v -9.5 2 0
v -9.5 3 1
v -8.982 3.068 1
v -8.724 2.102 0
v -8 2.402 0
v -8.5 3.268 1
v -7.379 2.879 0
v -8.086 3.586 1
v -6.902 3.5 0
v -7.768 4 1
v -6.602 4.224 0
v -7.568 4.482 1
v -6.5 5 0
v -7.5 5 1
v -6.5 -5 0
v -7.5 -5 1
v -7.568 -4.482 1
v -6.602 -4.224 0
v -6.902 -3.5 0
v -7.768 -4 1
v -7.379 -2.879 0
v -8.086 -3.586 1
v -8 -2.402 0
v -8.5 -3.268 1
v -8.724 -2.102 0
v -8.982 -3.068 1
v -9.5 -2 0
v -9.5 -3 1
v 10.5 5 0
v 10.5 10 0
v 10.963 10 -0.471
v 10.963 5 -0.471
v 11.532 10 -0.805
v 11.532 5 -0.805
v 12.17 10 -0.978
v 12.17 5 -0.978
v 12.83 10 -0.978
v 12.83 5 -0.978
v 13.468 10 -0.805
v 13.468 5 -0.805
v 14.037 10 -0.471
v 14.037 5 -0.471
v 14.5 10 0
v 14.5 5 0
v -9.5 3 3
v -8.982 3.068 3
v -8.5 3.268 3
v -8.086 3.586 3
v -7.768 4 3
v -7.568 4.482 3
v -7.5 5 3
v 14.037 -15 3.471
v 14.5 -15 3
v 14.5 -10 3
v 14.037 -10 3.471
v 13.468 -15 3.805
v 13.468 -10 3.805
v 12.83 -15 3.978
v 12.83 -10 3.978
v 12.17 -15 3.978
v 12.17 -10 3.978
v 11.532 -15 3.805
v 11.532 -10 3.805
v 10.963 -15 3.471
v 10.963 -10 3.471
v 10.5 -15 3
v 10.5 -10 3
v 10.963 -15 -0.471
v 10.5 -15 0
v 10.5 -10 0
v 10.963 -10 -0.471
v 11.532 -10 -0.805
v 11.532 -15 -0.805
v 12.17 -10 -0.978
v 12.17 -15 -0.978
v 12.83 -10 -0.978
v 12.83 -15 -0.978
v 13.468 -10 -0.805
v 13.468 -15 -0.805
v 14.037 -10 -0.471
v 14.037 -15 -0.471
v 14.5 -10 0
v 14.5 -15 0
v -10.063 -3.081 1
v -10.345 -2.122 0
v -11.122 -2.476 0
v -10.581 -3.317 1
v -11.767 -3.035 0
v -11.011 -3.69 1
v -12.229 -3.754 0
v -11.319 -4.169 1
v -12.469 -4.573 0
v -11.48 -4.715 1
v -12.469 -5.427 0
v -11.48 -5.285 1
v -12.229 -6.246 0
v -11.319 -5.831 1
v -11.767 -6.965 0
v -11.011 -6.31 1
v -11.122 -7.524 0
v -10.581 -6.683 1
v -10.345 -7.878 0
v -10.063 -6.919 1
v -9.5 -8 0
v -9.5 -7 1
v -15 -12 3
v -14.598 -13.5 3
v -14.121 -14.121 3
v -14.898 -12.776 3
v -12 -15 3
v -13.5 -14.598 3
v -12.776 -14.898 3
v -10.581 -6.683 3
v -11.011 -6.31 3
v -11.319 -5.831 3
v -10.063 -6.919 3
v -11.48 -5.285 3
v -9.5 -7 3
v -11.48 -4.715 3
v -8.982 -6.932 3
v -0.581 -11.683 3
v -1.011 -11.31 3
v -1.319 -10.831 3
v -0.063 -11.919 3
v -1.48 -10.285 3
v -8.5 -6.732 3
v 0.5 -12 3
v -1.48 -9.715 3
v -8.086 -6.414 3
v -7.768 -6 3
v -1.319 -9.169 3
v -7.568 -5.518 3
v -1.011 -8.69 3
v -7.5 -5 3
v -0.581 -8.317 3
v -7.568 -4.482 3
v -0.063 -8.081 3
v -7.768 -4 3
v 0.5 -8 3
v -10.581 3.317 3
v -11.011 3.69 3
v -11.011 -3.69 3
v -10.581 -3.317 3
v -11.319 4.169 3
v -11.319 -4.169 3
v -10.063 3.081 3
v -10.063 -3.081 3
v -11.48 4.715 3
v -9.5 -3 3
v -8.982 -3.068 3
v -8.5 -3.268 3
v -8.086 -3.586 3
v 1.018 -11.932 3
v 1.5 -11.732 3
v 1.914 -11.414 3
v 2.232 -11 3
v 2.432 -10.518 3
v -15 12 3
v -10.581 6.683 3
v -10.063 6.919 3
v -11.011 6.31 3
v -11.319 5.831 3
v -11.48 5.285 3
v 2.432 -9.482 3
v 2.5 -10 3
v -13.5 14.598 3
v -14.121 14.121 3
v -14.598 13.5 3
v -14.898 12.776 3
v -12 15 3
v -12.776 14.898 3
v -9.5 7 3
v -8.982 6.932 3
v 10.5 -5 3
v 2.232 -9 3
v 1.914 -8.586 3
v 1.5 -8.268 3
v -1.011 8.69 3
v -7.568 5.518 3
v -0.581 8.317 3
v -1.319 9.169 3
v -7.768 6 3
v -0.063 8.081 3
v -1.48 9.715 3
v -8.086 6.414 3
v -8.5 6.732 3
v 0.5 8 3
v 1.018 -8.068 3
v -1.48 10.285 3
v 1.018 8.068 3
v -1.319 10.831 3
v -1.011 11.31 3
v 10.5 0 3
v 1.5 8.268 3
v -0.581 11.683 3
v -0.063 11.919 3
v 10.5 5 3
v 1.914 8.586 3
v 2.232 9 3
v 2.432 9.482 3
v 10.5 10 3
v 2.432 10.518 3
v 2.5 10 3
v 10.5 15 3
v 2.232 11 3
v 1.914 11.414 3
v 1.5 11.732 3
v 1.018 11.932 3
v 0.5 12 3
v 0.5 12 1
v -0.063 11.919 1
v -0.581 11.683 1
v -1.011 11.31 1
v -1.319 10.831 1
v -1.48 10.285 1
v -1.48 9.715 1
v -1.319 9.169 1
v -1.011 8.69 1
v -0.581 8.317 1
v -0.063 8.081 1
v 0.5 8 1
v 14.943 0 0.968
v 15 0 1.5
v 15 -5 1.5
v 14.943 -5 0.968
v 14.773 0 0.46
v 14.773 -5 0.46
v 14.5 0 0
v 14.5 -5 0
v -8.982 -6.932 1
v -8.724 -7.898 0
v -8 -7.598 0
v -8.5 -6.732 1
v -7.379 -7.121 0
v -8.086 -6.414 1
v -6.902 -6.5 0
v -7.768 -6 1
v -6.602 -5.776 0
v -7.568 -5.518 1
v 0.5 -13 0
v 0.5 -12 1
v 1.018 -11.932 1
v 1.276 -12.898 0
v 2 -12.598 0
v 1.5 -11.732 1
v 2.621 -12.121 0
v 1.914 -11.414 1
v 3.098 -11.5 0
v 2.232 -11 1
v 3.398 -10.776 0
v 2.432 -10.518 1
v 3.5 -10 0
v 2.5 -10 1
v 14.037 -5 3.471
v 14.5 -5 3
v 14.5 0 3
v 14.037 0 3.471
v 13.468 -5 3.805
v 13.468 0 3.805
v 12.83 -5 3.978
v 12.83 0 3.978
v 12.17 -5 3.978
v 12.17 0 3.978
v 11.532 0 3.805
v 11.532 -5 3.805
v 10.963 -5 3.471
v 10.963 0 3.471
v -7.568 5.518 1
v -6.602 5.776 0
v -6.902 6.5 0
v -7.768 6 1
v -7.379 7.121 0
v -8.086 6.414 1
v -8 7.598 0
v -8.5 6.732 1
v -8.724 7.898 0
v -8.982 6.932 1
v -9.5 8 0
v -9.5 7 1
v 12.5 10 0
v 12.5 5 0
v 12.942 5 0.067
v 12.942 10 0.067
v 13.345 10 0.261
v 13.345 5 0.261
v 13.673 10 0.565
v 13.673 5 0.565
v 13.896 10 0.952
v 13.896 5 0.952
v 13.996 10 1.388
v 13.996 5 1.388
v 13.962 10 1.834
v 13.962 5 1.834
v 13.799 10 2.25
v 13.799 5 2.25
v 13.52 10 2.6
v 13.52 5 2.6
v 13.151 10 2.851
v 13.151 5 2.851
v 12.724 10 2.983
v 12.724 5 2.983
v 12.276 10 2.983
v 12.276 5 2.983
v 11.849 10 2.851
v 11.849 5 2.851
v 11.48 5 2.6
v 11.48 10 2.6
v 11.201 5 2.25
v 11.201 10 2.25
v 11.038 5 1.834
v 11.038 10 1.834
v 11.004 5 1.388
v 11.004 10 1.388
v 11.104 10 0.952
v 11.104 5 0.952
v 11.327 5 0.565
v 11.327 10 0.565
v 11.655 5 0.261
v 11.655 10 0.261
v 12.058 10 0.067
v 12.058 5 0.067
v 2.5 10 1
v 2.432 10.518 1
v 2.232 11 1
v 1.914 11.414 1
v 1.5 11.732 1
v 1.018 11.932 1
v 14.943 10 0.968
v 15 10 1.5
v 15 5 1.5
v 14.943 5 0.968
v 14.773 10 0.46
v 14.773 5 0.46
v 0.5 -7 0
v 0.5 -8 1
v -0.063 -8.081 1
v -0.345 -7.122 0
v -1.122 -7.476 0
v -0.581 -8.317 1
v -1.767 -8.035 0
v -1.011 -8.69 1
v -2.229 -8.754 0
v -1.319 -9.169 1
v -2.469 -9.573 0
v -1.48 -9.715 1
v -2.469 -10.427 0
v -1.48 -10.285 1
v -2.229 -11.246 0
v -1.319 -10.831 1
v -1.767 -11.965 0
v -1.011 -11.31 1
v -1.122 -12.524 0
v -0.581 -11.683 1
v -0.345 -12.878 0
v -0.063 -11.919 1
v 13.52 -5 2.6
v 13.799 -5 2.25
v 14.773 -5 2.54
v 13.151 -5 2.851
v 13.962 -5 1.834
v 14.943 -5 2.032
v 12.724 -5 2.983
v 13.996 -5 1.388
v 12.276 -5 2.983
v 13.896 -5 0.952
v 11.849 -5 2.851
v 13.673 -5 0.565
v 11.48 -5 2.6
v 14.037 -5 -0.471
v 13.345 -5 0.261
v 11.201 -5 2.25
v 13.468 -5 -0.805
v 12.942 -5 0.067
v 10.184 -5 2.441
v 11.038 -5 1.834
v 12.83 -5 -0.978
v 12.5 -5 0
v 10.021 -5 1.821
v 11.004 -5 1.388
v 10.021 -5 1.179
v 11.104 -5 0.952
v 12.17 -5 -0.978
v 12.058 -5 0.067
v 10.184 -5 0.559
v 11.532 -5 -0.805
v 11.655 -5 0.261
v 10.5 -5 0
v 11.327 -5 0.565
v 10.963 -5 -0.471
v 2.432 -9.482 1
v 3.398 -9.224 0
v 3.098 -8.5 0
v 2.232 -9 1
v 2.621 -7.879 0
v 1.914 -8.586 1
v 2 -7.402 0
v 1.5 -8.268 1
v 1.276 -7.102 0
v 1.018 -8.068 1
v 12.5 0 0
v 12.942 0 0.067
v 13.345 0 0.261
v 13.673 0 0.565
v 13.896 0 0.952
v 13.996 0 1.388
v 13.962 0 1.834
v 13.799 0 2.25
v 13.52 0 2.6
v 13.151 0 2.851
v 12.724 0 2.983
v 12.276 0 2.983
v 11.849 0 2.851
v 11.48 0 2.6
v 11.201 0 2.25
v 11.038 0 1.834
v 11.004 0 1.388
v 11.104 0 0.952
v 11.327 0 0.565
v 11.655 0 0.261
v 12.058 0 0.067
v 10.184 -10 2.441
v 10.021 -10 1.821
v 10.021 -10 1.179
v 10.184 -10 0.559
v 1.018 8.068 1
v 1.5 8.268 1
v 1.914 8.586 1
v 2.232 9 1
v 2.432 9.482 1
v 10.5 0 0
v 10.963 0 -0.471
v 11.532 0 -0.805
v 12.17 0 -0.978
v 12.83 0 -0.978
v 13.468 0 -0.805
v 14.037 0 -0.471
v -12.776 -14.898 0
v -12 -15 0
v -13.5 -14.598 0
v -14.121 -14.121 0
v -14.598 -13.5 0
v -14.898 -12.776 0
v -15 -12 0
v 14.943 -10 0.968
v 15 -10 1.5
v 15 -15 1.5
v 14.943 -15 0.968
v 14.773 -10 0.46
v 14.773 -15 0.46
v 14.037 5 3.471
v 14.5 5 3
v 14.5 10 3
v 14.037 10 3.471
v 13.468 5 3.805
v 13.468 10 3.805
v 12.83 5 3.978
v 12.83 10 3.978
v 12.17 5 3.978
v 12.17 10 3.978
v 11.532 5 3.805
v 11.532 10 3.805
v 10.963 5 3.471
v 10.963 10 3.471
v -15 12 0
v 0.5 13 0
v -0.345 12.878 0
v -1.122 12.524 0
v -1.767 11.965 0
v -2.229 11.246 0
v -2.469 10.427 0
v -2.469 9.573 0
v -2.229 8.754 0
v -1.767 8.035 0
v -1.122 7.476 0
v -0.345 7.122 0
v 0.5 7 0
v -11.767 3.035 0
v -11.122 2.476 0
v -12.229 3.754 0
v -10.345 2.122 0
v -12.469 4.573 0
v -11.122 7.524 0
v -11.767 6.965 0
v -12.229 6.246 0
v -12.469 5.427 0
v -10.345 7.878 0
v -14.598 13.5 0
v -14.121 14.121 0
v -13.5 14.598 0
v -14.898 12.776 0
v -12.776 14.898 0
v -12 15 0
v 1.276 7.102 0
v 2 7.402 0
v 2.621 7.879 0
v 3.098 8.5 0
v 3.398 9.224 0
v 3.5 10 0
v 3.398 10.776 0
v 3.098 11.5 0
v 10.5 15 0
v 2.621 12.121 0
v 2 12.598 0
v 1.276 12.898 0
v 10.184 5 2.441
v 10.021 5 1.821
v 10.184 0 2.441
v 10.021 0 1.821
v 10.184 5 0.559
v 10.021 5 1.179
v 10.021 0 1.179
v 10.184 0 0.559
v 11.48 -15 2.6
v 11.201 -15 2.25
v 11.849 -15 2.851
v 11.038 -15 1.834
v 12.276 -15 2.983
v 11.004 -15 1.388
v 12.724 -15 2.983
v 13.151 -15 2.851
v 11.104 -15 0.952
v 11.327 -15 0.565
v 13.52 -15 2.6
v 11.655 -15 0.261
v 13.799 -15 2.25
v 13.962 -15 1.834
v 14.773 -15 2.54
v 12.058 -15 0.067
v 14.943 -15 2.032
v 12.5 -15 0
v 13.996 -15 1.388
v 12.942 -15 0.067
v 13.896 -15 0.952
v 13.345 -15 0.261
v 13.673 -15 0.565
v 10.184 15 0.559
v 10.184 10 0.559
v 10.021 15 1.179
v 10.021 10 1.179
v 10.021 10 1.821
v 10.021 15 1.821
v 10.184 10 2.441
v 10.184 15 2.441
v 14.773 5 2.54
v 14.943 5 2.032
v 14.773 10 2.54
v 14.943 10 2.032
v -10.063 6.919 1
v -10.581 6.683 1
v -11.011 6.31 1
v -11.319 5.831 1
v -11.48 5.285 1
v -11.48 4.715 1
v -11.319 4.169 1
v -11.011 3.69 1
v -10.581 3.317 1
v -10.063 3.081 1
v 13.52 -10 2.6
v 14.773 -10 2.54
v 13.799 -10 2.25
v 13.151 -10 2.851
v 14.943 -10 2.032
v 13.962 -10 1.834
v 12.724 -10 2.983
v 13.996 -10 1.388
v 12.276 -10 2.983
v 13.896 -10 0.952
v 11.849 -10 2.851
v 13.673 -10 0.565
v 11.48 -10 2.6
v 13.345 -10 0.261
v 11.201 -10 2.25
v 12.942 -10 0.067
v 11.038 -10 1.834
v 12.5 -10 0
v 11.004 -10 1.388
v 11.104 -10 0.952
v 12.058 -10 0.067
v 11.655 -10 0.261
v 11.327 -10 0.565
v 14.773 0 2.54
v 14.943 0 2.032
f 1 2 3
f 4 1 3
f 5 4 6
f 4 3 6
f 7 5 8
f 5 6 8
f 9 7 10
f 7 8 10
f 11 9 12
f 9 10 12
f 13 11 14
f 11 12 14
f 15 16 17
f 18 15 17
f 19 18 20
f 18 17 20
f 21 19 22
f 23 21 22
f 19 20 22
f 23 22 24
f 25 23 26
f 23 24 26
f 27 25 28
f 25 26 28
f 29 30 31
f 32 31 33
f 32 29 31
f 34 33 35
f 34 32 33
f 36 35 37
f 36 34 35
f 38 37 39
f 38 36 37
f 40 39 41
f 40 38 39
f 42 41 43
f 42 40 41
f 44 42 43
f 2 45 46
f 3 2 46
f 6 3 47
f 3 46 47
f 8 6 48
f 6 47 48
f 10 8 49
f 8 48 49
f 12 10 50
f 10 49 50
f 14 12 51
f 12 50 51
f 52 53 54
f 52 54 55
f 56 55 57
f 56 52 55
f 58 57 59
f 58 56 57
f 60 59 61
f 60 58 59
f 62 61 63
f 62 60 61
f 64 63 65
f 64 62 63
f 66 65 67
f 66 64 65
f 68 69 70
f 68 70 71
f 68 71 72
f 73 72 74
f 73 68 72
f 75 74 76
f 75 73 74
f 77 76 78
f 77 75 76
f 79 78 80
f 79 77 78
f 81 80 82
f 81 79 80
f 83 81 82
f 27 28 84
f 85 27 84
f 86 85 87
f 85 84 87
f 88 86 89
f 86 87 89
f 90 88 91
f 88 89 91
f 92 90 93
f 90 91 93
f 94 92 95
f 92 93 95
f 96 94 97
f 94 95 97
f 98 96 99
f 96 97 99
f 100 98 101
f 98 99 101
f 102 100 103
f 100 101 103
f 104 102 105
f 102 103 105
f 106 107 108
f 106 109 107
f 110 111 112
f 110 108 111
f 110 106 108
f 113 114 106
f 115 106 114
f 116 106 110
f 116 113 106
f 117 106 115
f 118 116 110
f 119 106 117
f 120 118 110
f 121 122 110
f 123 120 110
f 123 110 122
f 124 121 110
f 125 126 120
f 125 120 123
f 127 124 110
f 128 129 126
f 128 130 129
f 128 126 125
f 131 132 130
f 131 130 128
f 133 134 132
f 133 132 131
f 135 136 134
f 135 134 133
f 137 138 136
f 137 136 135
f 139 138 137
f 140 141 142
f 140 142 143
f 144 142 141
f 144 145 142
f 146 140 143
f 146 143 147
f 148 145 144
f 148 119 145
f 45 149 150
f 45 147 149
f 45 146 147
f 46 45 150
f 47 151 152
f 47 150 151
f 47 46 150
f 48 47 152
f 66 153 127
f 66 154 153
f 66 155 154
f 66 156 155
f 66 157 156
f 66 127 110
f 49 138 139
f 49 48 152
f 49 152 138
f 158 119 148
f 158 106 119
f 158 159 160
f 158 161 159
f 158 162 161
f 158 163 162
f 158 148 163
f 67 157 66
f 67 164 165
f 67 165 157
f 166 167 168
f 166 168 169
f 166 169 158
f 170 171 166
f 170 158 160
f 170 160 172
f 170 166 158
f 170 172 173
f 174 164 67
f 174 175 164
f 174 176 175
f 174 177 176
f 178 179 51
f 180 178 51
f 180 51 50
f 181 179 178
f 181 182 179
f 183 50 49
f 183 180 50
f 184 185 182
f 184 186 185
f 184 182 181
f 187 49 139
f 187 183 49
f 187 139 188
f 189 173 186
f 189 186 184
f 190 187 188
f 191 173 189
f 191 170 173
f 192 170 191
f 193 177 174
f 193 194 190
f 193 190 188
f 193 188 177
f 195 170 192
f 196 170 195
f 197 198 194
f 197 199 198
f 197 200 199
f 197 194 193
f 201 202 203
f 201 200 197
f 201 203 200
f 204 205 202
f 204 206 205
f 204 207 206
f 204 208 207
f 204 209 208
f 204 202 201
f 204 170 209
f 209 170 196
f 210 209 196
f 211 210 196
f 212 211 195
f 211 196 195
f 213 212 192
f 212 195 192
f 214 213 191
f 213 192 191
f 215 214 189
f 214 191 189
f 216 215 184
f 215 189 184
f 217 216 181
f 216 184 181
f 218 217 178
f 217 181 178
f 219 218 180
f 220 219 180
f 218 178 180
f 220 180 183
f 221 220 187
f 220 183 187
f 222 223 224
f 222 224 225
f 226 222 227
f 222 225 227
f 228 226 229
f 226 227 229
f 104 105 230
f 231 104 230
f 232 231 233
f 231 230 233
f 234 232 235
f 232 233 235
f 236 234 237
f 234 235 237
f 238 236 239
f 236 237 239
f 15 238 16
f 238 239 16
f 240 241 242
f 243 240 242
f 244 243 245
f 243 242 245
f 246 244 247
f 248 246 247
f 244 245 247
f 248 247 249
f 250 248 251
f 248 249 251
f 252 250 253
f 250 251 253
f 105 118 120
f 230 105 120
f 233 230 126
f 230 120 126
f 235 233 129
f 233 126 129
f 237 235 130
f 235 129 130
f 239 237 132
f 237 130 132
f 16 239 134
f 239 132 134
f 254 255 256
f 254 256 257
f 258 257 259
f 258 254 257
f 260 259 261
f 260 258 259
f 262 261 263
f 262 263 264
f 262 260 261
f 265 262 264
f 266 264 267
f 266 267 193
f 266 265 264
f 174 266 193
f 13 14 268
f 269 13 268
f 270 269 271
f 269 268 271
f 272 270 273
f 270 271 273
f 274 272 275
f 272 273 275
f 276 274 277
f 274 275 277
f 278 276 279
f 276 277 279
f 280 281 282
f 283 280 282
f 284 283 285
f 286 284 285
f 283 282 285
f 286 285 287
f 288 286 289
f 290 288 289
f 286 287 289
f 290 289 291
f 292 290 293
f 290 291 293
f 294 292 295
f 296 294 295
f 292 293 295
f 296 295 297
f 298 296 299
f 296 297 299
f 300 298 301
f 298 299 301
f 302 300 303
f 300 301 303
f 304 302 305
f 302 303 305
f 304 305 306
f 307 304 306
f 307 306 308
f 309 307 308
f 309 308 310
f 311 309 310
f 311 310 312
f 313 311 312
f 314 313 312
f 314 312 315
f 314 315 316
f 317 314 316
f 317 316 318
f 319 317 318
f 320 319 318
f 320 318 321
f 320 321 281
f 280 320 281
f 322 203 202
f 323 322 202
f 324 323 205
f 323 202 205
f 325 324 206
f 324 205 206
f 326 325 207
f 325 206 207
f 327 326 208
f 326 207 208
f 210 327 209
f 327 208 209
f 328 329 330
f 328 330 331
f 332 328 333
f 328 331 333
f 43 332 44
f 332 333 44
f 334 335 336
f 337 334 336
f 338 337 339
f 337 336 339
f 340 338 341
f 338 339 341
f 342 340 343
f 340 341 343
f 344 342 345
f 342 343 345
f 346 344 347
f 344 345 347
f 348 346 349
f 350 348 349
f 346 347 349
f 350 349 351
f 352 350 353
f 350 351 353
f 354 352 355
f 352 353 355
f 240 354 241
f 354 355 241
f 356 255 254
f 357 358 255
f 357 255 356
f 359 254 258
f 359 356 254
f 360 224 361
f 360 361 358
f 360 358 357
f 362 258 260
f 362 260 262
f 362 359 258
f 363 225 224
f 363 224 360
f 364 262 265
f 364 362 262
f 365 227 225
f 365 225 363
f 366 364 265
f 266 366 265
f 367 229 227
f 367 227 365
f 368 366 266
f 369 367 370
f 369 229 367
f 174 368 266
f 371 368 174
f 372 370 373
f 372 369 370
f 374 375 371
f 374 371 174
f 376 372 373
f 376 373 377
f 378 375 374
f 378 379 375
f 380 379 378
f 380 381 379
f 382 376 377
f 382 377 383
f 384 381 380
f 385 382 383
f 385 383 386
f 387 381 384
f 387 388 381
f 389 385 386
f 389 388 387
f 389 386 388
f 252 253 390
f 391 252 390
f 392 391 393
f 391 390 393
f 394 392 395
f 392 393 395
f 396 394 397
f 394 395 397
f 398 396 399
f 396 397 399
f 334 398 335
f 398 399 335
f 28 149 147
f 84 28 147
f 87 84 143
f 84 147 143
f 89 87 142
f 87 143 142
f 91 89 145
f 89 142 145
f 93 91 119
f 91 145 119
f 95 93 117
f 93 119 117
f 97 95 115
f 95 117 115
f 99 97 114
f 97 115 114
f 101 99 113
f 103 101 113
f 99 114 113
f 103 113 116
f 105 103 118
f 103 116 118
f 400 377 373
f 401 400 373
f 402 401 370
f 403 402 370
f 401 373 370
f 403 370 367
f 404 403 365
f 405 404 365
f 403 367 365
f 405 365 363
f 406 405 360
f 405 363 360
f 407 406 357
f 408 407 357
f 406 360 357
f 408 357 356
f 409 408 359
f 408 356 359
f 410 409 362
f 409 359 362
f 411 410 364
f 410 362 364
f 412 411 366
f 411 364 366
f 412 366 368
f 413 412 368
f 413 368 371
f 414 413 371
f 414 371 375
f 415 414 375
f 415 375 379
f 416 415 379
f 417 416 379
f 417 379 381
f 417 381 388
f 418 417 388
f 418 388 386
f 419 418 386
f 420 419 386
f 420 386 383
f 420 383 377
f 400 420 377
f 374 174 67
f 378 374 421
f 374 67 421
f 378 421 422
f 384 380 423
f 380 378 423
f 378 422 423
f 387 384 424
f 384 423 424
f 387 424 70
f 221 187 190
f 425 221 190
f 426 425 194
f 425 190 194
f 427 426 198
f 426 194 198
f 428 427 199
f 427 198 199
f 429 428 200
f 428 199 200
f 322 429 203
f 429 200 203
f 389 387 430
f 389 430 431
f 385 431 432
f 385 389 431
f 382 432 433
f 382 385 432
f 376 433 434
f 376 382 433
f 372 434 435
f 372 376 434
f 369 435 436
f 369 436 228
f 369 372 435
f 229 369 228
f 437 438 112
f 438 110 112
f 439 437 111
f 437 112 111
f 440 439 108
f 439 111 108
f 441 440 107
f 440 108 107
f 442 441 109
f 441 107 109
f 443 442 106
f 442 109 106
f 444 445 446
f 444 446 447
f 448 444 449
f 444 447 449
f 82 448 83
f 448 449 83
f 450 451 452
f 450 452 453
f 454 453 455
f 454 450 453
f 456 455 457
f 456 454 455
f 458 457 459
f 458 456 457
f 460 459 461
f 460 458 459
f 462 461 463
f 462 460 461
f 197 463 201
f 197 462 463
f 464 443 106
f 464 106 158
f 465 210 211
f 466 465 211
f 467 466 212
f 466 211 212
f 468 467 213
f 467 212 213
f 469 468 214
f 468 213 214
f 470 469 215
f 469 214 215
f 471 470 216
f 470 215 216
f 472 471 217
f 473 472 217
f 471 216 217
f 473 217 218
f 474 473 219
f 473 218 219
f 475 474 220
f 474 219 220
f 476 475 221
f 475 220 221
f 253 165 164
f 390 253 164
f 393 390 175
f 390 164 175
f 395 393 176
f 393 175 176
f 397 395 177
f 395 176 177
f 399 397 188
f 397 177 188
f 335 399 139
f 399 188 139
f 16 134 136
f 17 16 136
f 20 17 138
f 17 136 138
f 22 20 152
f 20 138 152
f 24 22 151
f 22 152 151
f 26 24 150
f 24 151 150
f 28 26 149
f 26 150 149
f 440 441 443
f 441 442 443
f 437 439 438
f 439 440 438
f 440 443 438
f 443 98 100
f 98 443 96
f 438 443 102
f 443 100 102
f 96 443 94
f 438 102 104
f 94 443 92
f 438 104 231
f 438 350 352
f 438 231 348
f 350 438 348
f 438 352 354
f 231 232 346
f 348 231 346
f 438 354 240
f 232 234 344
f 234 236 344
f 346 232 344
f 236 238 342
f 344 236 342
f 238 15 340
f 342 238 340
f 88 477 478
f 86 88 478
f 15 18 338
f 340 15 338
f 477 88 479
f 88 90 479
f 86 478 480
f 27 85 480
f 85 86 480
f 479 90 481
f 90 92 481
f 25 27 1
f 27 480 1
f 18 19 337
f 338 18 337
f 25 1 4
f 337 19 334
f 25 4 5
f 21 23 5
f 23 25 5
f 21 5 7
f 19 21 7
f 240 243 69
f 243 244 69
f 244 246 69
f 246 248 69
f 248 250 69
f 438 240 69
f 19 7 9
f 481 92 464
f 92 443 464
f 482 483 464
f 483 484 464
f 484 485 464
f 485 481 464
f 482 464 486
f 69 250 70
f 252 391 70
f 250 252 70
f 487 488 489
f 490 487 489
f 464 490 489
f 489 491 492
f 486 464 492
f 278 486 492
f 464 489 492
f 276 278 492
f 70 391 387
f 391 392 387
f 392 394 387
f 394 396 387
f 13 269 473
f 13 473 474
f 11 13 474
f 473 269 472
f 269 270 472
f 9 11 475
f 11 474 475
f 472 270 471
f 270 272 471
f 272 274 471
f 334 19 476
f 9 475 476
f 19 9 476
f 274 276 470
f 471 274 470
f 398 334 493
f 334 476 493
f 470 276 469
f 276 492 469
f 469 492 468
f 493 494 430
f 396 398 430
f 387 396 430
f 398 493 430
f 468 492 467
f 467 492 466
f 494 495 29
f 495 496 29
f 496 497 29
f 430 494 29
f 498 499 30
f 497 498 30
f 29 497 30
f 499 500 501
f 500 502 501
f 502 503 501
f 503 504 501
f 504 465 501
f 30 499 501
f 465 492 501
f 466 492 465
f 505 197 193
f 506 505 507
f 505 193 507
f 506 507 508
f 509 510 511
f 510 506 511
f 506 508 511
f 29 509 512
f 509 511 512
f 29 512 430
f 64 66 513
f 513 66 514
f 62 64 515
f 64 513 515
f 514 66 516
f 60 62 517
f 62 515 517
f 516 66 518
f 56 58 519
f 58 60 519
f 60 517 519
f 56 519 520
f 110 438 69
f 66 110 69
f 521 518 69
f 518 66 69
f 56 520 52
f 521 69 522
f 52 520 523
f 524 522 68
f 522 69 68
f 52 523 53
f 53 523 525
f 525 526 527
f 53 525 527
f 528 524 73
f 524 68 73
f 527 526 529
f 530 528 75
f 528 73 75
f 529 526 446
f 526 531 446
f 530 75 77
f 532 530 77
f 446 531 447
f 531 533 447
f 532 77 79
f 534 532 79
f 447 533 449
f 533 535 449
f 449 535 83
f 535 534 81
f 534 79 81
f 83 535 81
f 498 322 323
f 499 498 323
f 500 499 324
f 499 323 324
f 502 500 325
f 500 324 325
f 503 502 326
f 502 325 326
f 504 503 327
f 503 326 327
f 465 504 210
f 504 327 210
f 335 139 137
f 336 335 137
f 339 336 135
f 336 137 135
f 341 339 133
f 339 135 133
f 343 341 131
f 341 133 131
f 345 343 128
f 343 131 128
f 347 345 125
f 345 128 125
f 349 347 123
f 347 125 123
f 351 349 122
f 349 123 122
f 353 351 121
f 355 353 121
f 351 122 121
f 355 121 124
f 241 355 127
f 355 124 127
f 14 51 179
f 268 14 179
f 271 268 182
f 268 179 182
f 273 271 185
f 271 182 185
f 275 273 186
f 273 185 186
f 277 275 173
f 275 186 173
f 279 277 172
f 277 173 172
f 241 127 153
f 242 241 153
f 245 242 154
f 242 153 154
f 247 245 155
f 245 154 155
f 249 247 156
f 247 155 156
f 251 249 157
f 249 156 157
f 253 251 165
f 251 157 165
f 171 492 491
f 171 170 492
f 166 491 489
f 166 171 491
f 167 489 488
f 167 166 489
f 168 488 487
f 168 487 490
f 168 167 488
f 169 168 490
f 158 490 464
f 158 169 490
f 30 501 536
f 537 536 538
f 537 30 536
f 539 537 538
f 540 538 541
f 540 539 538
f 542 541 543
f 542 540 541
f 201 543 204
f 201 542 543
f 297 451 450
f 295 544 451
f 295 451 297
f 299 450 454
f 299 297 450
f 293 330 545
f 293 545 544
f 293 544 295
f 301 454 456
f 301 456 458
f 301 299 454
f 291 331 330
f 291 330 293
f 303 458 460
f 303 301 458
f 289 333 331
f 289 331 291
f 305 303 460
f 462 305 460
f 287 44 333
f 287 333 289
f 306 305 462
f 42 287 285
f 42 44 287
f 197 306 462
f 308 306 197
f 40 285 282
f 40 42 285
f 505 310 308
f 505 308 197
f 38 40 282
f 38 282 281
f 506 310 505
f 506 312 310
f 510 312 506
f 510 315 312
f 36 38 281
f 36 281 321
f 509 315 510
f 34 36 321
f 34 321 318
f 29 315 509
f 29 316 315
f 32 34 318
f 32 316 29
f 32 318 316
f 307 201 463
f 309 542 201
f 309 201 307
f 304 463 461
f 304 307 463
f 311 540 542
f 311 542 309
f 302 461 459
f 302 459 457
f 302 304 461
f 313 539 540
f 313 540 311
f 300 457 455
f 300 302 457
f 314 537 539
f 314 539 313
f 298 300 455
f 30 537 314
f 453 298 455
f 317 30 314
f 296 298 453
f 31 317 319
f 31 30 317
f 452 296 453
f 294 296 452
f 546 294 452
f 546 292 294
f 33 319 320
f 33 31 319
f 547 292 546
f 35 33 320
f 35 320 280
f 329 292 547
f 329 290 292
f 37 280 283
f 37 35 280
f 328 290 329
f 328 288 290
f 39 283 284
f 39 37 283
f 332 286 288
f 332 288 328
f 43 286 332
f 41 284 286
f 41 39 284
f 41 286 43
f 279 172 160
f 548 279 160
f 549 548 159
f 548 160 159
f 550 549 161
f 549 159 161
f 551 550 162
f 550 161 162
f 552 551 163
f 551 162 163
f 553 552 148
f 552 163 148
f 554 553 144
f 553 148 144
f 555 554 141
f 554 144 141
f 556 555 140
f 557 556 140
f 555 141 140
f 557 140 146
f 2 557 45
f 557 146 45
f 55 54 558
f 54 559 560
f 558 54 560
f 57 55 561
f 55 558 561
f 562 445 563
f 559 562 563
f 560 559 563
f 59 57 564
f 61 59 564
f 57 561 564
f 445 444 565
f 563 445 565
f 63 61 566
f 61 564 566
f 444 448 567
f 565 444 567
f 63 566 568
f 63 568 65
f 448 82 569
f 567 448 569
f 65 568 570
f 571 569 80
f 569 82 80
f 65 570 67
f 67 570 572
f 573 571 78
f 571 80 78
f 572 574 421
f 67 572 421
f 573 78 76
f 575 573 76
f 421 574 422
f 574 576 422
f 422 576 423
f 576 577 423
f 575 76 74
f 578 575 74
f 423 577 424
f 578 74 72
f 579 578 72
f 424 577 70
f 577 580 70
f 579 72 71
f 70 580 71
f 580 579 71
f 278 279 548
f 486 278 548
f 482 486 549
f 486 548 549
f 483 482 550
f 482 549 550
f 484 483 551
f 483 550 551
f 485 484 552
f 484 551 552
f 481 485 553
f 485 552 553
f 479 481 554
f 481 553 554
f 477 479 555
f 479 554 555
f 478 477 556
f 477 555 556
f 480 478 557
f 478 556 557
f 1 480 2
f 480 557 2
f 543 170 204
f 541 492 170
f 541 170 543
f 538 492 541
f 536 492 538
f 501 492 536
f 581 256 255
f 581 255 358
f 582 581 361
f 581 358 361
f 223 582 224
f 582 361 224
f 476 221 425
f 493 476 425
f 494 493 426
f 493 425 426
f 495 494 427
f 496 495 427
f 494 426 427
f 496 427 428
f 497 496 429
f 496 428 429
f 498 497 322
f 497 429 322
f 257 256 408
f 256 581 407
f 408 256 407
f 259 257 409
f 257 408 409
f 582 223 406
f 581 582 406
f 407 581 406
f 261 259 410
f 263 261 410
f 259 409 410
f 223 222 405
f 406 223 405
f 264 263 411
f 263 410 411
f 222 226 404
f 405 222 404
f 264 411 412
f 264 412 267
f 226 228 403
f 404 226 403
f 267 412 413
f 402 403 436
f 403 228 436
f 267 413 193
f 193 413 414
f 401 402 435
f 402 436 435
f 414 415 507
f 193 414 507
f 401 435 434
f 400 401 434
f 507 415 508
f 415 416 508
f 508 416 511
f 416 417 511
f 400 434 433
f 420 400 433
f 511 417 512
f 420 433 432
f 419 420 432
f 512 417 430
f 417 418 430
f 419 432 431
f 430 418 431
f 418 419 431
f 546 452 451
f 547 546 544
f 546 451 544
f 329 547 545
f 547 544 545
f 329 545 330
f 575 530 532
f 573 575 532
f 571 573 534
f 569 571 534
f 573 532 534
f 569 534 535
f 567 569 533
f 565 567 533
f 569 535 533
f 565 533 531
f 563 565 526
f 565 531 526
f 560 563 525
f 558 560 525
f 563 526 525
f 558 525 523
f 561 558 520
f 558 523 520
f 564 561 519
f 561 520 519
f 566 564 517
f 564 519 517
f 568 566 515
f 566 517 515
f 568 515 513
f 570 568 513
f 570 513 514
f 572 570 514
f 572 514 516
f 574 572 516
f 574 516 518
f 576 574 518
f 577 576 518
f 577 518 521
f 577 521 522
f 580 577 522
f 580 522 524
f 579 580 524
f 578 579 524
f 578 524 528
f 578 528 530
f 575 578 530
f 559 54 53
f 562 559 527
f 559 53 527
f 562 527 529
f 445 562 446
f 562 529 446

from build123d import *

# Parameters (mm, degrees)
SKETCH_1_W          = 30
SKETCH_1_H          = 30
EXTRUDE_1_DEPTH     = 3
CUT_EXTRUDE_1_DEPTH = 34.674916481
SKETCH_3_R          = 2.5
EXTRUDE_3_DEPTH     = 30
FILLET_1_R          = 3
CUT_EXTRUDE_2_DEPTH = 22.587033145
SKETCH_6_R          = 2.5
CUT_EXTRUDE_3_DEPTH = 5
SKETCH_7_R          = 2.5
CUT_EXTRUDE_4_DEPTH = 5
CUT_EXTRUDE_START   = -5
SKETCH_8_R          = 2.5
CUT_EXTRUDE_5_DEPTH = 5
SKETCH_9_R          = 1.5
CUT_EXTRUDE_6_DEPTH = 34.778691508
CHAMFER_1_SIZE      = 1


with BuildPart() as part:
    # Эскиз1 → Бобышка-Вытянуть1 (new body)
    with BuildSketch(Plane.XY):
        Rectangle(SKETCH_1_W, SKETCH_1_H)
    extrude(amount=EXTRUDE_1_DEPTH)

    # Эскиз2 → Вырез-Вытянуть1 (cut, through all)
    with BuildSketch(Plane.XZ.offset(15)):
        with BuildLine():
            Line((15, 0), (15, 1.5))
            ThreePointArc((15, 1.5), (14.871708245, 0.709430585), (14.5, 0))
            Line((14.5, 0), (15, 0))
        make_face()
        with BuildLine():
            ThreePointArc((14.5, 3), (14.871708245, 2.290569415), (15, 1.5))
            Line((15, 1.5), (15, 3))
            Line((15, 3), (14.5, 3))
        make_face()
    extrude(amount=-CUT_EXTRUDE_1_DEPTH, mode=Mode.SUBTRACT)

    # Эскиз3 → Бобышка-Вытянуть3 (add)
    with BuildSketch(Plane.XZ.offset(15)):
        with Locations((12.5, 1.5)):
            Circle(SKETCH_3_R)
    extrude(amount=-EXTRUDE_3_DEPTH)

    # Скругление1
    fillet_1_edges = [part.edges().sort_by_distance(p)[0] for p in [
        (-15, -15, 1.5),
        (-15, 15, 1.5),
    ]]
    fillet(fillet_1_edges, radius=FILLET_1_R)

    # Эскиз4 → Вырез-Вытянуть2 (cut, through all)
    with BuildSketch(Plane.XY.offset(3)):
        with BuildLine():
            ThreePointArc((-7.5, -5), (-8.085786438, -3.585786438), (-9.5, -3))
            Line((-9.5, -3), (-9.5, -7))
            ThreePointArc((-9.5, -7), (-8.085786438, -6.414213562), (-7.5, -5))
        make_face()
        with BuildLine():
            Line((-9.5, -7), (-9.5, -3))
            ThreePointArc((-9.5, -3), (-11.5, -5), (-9.5, -7))
        make_face()
        with BuildLine():
            ThreePointArc((0.5, -8), (-1.5, -10), (0.5, -12))
            Line((0.5, -12), (0.5, -8))
        make_face()
        with BuildLine():
            Line((0.5, -8), (0.5, -12))
            ThreePointArc((0.5, -12), (1.914213562, -11.414213562), (2.5, -10))
            ThreePointArc((2.5, -10), (1.914213562, -8.585786438), (0.5, -8))
        make_face()
        with BuildLine():
            ThreePointArc((-9.5, 7), (-11.5, 5), (-9.5, 3))
            Line((-9.5, 3), (-9.5, 5))
            Line((-9.5, 5), (-9.5, 7))
        make_face()
        with BuildLine():
            Line((-9.5, 5), (-9.5, 3))
            ThreePointArc((-9.5, 3), (-8.085786438, 3.585786438), (-7.5, 5))
            ThreePointArc((-7.5, 5), (-8.085786438, 6.414213562), (-9.5, 7))
            Line((-9.5, 7), (-9.5, 5))
        make_face()
        with BuildLine():
            ThreePointArc((0.5, 12), (-1.5, 10), (0.5, 8))
            Line((0.5, 8), (0.5, 10))
            Line((0.5, 10), (0.5, 12))
        make_face()
        with BuildLine():
            Line((0.5, 10), (0.5, 8))
            ThreePointArc((0.5, 8), (1.914213562, 8.585786438), (2.5, 10))
            ThreePointArc((2.5, 10), (1.914213562, 11.414213562), (0.5, 12))
            Line((0.5, 12), (0.5, 10))
        make_face()
    extrude(amount=-CUT_EXTRUDE_2_DEPTH, mode=Mode.SUBTRACT)

    # Эскиз6 → Вырез-Вытянуть3 (cut)
    with BuildSketch(Plane(origin=(0, -10, 0), x_dir=(-1, 0, 0), z_dir=(0, -1, 0))):
        with Locations((-12.5, -1.5)):
            Circle(SKETCH_6_R)
    extrude(amount=-CUT_EXTRUDE_3_DEPTH, mode=Mode.SUBTRACT)

    # Эскиз7 → Вырез-Вытянуть4 (cut)
    with BuildSketch(Plane(origin=(0, 0, 0), x_dir=(-1, 0, 0), z_dir=(0, -1, 0))):
        with Locations((-12.5, -1.5)):
            Circle(SKETCH_7_R)
    extrude(amount=-CUT_EXTRUDE_4_DEPTH, mode=Mode.SUBTRACT)

    # Эскиз8 → Вырез-Вытянуть5 (cut)
    with BuildSketch(Plane(origin=(0, 15, 0), x_dir=(1, 0, 0), z_dir=(0, 1, 0)).offset(CUT_EXTRUDE_START)):
        with Locations((12.5, -1.5)):
            Circle(SKETCH_8_R)
    extrude(amount=CUT_EXTRUDE_5_DEPTH, mode=Mode.SUBTRACT)

    # Эскиз9 → Вырез-Вытянуть6 (cut, through all)
    with BuildSketch(Plane.XZ.offset(15)):
        with Locations(Location((12.5, 1.5, 0), (0, 0, 270))):
            Circle(SKETCH_9_R)
    extrude(amount=-CUT_EXTRUDE_6_DEPTH, mode=Mode.SUBTRACT)

    # Фаска1
    chamfer_1_edges = [part.edges().sort_by_distance(p)[0] for p in [
        (-9.5, -3, 0),
        (0.5, -8, 0),
        (-9.5, 3, 0),
        (0.5, 8, 0),
    ]]
    chamfer(chamfer_1_edges, length=CHAMFER_1_SIZE)


solid = part.part
